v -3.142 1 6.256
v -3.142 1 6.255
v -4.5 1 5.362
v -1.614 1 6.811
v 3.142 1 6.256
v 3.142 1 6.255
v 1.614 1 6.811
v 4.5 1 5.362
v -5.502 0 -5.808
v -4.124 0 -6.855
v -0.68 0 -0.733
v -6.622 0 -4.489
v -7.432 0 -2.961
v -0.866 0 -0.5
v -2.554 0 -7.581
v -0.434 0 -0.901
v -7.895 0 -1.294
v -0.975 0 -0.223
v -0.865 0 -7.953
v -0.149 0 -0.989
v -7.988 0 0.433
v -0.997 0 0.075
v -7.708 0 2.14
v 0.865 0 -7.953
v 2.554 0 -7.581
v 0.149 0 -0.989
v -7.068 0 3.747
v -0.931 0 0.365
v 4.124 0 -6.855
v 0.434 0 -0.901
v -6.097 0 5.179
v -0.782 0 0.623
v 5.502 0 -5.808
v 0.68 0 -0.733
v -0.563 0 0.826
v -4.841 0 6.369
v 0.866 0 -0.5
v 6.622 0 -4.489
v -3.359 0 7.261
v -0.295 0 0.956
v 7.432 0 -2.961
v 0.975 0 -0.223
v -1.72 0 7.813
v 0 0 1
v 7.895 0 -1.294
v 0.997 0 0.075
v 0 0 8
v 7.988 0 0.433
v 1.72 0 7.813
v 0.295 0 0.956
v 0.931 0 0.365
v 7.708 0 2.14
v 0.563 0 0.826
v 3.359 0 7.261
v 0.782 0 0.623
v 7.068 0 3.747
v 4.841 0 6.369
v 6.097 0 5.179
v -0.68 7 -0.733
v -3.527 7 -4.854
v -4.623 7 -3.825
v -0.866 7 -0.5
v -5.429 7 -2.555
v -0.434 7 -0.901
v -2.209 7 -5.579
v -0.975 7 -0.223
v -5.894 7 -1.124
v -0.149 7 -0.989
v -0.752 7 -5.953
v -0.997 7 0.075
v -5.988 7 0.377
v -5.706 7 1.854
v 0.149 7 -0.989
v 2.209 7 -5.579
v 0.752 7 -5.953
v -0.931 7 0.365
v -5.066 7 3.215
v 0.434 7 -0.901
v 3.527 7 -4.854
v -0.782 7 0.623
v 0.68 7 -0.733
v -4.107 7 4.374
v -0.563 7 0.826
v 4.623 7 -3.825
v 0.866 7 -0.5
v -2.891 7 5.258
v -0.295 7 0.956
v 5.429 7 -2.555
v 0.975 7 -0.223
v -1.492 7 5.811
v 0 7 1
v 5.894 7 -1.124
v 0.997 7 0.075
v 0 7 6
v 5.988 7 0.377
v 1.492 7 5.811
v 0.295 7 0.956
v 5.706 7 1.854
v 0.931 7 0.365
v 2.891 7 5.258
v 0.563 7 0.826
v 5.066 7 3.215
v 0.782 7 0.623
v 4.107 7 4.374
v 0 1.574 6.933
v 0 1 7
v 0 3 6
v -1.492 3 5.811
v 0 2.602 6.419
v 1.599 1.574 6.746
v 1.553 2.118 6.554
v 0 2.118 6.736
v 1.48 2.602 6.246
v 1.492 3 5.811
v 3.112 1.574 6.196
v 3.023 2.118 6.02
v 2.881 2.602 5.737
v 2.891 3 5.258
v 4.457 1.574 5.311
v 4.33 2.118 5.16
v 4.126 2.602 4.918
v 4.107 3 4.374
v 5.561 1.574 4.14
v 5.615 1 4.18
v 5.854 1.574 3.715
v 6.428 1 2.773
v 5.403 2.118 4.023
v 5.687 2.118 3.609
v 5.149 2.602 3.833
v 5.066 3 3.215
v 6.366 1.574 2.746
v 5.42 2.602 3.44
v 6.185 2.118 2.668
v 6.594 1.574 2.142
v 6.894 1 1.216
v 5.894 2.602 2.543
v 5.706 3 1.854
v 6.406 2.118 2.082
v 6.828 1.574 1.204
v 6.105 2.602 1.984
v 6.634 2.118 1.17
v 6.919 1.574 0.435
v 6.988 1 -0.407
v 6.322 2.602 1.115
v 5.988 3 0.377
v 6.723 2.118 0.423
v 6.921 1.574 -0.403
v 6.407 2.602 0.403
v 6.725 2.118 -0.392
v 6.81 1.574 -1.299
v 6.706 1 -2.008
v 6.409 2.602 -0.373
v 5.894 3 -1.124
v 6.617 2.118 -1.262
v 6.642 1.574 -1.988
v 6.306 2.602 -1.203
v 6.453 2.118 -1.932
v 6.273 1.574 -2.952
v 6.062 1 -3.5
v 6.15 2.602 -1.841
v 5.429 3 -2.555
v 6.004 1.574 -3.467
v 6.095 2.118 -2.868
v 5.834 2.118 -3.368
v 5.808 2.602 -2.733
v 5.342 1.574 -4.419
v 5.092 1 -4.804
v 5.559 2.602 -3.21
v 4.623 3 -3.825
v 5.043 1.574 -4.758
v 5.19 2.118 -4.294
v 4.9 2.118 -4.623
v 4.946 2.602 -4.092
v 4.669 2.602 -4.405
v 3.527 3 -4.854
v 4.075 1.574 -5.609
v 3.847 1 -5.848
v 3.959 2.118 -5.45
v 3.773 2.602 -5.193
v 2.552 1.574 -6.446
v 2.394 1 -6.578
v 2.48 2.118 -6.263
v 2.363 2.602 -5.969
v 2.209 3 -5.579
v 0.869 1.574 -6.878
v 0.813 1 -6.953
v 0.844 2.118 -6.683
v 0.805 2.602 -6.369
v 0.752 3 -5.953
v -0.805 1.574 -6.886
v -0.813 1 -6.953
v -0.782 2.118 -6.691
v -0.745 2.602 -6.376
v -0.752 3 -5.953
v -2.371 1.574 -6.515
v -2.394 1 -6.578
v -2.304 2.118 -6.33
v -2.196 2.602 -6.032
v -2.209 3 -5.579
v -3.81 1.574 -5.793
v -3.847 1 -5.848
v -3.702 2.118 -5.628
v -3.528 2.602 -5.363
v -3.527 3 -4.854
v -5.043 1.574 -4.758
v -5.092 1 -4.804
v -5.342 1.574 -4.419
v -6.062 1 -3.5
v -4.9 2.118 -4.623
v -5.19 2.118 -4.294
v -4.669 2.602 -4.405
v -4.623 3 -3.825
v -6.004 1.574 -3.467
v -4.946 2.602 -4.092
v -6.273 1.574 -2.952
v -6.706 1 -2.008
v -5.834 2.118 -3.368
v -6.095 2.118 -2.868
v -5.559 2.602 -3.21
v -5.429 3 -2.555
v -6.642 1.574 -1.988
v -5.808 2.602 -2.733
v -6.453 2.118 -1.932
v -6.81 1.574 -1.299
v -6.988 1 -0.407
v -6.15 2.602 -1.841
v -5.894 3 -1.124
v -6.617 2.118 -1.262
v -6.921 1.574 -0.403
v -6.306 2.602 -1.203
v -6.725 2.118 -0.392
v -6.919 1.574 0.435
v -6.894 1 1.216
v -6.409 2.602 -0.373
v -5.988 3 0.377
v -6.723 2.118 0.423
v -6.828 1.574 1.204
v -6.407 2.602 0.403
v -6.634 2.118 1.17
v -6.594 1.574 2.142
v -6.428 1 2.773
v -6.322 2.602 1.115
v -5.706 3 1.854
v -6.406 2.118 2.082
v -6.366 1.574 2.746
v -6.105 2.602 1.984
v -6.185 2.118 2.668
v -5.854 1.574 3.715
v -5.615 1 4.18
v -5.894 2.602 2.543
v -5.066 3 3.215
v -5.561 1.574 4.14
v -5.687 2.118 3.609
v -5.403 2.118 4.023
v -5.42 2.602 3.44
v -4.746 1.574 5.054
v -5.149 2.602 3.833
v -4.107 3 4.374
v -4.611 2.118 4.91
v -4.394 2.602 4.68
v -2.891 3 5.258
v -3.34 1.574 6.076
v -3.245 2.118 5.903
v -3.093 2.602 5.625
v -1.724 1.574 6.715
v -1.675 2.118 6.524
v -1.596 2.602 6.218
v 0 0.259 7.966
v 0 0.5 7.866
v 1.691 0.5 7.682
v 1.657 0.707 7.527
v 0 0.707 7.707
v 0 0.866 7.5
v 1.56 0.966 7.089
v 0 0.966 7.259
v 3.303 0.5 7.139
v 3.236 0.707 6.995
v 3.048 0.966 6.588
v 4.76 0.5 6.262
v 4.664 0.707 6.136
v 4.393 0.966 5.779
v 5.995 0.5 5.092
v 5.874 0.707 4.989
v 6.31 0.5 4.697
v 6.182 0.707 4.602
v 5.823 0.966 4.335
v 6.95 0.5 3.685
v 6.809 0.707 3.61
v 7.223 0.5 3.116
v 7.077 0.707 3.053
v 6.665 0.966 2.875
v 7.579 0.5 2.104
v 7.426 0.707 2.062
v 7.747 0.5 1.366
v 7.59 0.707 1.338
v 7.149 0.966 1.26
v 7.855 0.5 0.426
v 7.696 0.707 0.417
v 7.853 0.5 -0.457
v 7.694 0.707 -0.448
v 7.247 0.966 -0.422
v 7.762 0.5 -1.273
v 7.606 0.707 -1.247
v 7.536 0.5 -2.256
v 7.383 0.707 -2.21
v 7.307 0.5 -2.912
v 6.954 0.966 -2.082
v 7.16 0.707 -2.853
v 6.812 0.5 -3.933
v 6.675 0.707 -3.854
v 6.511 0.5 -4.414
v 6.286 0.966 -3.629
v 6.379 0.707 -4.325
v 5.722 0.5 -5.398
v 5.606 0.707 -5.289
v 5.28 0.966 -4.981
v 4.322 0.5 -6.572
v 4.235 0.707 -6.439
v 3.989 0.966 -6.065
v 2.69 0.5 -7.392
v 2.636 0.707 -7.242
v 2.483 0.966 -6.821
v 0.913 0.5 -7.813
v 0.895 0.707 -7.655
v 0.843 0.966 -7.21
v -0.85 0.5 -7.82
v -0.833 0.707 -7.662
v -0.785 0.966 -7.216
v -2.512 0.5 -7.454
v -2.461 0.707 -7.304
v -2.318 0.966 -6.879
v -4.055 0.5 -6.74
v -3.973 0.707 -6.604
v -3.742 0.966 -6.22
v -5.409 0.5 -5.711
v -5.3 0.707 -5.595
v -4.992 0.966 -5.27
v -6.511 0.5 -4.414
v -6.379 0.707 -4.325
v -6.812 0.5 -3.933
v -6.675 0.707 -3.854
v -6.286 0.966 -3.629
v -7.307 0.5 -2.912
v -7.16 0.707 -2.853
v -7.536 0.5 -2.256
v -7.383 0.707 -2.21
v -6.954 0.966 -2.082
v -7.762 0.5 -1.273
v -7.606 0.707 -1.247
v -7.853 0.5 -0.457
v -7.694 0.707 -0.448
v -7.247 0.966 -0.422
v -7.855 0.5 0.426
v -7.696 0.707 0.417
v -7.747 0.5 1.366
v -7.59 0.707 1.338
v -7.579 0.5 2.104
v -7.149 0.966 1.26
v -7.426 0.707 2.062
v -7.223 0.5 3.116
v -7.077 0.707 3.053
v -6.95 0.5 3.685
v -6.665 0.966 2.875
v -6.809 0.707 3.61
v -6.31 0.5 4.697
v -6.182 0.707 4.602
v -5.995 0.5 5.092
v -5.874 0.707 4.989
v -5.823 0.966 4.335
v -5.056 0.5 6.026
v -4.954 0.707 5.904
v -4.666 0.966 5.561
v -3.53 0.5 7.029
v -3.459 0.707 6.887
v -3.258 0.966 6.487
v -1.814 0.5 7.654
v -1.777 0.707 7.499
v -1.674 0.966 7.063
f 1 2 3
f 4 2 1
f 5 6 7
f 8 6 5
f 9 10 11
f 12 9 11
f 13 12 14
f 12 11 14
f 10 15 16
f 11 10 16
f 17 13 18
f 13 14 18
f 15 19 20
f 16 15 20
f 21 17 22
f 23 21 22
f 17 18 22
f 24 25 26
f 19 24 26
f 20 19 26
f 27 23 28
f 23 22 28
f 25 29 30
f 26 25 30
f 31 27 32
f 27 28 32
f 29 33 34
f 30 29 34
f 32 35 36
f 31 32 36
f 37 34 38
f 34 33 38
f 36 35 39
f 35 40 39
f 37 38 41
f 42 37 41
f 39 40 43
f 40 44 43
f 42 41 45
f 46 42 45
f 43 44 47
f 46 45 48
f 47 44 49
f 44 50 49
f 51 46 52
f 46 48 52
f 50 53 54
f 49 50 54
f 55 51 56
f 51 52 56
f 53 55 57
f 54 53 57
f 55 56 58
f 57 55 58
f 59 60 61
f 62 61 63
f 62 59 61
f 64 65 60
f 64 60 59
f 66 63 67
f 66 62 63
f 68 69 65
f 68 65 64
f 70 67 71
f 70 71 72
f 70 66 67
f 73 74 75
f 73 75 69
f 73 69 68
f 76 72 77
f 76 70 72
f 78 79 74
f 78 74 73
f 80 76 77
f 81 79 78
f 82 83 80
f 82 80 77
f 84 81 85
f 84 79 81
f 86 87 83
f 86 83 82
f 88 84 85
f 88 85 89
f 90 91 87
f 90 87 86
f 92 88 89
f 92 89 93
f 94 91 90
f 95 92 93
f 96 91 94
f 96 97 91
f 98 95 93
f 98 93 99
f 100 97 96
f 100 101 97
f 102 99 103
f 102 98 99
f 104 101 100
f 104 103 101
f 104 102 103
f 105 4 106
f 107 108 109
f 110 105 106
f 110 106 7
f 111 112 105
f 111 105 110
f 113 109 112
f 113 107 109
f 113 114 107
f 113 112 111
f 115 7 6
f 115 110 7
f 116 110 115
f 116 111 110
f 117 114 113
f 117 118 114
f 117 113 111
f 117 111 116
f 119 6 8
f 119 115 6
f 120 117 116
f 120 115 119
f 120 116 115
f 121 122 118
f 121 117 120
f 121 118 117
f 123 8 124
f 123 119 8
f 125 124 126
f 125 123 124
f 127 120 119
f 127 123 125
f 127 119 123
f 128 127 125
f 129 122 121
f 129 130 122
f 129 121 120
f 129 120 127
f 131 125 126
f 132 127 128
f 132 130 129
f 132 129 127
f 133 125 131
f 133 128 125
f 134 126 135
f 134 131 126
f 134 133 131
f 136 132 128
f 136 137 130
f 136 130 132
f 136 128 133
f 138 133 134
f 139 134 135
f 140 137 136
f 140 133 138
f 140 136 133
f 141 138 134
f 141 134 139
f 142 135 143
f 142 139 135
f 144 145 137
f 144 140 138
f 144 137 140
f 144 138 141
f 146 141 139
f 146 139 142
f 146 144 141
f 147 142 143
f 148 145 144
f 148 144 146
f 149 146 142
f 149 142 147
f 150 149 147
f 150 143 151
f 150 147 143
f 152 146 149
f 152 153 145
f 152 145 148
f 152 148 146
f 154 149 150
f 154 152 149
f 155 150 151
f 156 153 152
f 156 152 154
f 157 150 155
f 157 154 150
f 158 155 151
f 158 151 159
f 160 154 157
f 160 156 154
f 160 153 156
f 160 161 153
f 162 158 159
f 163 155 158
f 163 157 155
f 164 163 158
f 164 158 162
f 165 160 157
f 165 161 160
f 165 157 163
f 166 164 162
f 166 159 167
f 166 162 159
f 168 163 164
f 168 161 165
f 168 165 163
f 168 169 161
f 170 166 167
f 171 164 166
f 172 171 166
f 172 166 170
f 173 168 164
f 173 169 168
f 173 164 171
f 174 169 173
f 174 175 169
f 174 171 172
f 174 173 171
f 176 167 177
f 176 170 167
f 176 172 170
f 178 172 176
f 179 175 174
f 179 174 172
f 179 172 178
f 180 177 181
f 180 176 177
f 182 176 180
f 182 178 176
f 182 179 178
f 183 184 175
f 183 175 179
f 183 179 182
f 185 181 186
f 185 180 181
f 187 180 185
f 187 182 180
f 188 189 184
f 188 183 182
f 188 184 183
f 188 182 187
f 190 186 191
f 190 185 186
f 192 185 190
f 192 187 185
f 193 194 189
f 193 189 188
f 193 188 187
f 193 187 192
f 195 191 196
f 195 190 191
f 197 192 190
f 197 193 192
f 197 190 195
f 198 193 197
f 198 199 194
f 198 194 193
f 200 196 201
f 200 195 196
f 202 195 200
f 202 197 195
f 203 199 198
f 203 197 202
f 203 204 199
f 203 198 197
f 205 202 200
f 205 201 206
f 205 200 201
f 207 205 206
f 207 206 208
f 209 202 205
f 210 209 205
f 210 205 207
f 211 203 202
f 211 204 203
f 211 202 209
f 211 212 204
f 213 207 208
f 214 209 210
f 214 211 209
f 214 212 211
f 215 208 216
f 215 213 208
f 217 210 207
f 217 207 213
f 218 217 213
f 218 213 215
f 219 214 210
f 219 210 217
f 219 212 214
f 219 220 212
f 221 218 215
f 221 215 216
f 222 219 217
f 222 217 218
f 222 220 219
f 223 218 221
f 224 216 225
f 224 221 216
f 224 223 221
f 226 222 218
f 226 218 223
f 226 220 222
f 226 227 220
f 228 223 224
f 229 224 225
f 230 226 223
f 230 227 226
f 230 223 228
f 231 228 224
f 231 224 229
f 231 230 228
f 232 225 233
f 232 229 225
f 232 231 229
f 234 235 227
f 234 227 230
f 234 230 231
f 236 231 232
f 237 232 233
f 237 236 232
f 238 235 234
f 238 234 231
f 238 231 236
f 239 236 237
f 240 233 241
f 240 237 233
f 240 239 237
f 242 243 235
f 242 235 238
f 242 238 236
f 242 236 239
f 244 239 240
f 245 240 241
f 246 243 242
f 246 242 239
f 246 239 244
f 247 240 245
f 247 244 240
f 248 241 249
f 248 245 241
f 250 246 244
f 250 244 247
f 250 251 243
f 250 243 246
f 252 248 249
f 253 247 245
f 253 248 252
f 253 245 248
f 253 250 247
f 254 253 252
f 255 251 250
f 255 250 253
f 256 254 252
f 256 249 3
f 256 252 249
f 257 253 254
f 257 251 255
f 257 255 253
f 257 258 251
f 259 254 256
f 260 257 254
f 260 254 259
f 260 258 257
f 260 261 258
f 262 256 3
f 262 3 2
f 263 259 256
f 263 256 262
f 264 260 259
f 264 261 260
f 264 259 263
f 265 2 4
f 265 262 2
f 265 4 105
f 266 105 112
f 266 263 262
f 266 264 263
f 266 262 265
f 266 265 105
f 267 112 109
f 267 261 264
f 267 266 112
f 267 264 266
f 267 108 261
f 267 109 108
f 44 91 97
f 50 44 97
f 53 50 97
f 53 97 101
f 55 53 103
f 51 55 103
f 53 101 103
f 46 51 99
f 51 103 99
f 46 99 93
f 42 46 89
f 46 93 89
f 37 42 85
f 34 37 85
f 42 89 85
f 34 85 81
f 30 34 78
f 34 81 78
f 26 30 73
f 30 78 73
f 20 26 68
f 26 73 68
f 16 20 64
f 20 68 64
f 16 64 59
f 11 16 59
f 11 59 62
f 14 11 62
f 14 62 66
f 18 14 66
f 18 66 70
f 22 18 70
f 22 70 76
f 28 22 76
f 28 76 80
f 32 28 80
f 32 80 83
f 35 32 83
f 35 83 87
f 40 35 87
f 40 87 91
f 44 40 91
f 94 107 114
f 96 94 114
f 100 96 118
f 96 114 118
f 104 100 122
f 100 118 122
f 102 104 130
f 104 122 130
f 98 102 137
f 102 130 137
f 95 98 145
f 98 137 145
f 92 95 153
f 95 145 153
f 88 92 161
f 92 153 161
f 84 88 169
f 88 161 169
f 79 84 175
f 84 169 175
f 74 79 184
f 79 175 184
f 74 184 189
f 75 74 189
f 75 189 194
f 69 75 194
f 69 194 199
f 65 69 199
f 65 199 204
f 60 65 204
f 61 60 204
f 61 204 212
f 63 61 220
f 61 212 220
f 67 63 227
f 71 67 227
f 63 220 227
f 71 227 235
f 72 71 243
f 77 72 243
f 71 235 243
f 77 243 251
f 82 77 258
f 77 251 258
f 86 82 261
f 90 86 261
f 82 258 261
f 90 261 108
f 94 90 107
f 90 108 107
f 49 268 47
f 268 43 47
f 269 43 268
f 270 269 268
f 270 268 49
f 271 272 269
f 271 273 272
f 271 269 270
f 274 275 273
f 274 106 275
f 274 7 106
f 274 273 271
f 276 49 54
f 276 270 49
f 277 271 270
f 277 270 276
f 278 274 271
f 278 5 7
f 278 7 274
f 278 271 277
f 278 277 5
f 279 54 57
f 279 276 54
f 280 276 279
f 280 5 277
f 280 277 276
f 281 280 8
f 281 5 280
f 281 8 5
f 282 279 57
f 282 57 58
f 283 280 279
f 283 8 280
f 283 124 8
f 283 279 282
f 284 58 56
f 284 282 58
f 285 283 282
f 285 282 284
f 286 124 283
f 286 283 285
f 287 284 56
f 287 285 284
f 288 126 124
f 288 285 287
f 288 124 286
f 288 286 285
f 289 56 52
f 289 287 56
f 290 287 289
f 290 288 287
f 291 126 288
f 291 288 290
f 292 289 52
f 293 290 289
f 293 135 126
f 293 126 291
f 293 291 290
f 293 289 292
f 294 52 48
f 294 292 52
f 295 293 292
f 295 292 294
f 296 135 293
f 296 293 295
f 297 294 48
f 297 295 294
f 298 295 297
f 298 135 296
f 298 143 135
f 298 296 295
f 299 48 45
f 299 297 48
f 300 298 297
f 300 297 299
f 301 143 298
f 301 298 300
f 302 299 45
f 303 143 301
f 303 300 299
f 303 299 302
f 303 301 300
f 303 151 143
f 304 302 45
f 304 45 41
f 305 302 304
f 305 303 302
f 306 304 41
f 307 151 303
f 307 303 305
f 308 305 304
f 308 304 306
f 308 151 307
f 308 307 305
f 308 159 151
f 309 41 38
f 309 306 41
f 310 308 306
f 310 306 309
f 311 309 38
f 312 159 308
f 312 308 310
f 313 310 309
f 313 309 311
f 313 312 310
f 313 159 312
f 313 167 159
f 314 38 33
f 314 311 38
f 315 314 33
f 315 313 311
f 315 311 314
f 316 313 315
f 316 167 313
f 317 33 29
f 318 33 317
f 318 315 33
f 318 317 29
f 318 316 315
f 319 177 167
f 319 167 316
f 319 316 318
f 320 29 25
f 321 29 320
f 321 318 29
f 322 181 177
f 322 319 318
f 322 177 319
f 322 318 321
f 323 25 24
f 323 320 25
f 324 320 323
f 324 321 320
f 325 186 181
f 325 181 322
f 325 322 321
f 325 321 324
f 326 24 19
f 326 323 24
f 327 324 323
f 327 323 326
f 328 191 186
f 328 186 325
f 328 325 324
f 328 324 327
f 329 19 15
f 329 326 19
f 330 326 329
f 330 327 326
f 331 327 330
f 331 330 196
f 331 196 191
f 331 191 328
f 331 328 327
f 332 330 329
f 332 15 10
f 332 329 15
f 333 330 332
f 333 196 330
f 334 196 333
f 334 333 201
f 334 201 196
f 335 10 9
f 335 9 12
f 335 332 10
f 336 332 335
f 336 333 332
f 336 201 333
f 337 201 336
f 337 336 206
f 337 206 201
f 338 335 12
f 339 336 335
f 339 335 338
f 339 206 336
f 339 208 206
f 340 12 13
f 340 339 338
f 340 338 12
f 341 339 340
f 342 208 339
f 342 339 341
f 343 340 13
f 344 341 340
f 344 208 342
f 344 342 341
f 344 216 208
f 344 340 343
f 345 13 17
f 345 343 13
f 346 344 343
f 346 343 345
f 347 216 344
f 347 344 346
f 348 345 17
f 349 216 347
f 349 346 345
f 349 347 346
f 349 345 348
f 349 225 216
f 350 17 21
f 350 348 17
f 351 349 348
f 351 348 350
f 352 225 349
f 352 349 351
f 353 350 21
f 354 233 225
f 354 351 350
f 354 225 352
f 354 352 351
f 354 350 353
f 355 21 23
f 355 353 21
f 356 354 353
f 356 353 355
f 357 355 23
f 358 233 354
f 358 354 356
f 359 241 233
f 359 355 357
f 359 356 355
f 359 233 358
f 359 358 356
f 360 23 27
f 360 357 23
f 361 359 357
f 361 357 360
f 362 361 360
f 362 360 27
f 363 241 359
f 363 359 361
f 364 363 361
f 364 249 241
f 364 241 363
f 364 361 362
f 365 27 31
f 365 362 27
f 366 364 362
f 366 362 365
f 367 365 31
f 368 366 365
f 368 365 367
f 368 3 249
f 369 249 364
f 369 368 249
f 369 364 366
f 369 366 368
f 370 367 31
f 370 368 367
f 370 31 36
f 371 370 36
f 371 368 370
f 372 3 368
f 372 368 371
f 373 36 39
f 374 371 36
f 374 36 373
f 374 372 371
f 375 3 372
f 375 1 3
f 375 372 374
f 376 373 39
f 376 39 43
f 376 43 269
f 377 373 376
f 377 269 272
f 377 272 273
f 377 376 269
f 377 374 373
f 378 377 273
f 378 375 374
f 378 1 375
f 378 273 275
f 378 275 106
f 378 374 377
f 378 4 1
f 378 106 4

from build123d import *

# Parameters (mm, degrees)
SKETCH1_R                         = 8
BLADE_HOLDER_EXTRUDE_DEPTH        = 1
SKETCH2_R                         = 7
BLADE_HOLDER_EXTRUDE_2_DEPTH      = 2
SKETCH3_R                         = 6
BLADE_HOLDER_EXTRUDE_3_DEPTH      = 4
SKETCH4_R                         = 1
HOLE_FOR_SCREW_BLADE_HOLDER_DEPTH = 24
BLADE_HOLDER_FILLET_1_R           = 1
BLADE_HOLDER_FILLET_2_R           = 2.5


# Some blends are built 0.0001 mm under size
with BuildPart() as part:
    # Sketch1 → Blade Holder Extrude (new body)
    with BuildSketch(Plane(origin=(0, 0, 0), x_dir=(1, 0, 0), z_dir=(0, 1, 0))):
        with Locations(Location((0, 0, 0), (0, 0, 270))):
            Circle(SKETCH1_R)
    extrude(amount=BLADE_HOLDER_EXTRUDE_DEPTH)

    # Sketch2 → Blade Holder Extrude 2 (add)
    with BuildSketch(Plane(origin=(0, 1, 0), x_dir=(1, 0, 0), z_dir=(0, 1, 0))):
        with Locations(Location((0, 0, 0), (0, 0, 270))):
            Circle(SKETCH2_R)
    extrude(amount=BLADE_HOLDER_EXTRUDE_2_DEPTH)

    # Sketch3 → Blade Holder Extrude 3 (add)
    with BuildSketch(Plane(origin=(0, 3, 0), x_dir=(1, 0, 0), z_dir=(0, 1, 0))):
        with Locations(Location((0, 0, 0), (0, 0, 270))):
            Circle(SKETCH3_R)
    extrude(amount=BLADE_HOLDER_EXTRUDE_3_DEPTH)

    # Sketch4 → Hole for Screw (Blade Holder) (cut)
    with BuildSketch(Plane(origin=(0, 7, 0), x_dir=(1, 0, 0), z_dir=(0, 1, 0))):
        with Locations(Location((0, 0, 0), (0, 0, 270))):
            Circle(SKETCH4_R)
    extrude(amount=-HOLE_FOR_SCREW_BLADE_HOLDER_DEPTH, mode=Mode.SUBTRACT)

    # Blade Holder Fillet 1
    blade_holder_fillet_1_edges = [part.edges().sort_by_distance(p)[0] for p in [
        (0, 1, -8),
    ]]
    fillet(blade_holder_fillet_1_edges, radius=BLADE_HOLDER_FILLET_1_R - 0.0001)  # a hair under: the kernel refuses the full size

    # Blade Holder Fillet 2
    # the kernel refuses this fillet: 2.5 mm, written as the material it takes off along each edge
    with BuildSketch(Plane(origin=(0, 3, 0), x_dir=(0, 0, 1), z_dir=(-1, 0, 0))) as blade_holder_fillet_2_piece_1:
        with BuildLine():
            CenterArc((4.5, -2), BLADE_HOLDER_FILLET_2_R, 0, 53.130102354)
            Line((6, 0), (7, 0))
            Line((7, 0), (7, -2))
        make_face()
    revolve(axis=Axis((0, 3, 0), (0, 1, 0)), mode=Mode.SUBTRACT)


solid = part.part
